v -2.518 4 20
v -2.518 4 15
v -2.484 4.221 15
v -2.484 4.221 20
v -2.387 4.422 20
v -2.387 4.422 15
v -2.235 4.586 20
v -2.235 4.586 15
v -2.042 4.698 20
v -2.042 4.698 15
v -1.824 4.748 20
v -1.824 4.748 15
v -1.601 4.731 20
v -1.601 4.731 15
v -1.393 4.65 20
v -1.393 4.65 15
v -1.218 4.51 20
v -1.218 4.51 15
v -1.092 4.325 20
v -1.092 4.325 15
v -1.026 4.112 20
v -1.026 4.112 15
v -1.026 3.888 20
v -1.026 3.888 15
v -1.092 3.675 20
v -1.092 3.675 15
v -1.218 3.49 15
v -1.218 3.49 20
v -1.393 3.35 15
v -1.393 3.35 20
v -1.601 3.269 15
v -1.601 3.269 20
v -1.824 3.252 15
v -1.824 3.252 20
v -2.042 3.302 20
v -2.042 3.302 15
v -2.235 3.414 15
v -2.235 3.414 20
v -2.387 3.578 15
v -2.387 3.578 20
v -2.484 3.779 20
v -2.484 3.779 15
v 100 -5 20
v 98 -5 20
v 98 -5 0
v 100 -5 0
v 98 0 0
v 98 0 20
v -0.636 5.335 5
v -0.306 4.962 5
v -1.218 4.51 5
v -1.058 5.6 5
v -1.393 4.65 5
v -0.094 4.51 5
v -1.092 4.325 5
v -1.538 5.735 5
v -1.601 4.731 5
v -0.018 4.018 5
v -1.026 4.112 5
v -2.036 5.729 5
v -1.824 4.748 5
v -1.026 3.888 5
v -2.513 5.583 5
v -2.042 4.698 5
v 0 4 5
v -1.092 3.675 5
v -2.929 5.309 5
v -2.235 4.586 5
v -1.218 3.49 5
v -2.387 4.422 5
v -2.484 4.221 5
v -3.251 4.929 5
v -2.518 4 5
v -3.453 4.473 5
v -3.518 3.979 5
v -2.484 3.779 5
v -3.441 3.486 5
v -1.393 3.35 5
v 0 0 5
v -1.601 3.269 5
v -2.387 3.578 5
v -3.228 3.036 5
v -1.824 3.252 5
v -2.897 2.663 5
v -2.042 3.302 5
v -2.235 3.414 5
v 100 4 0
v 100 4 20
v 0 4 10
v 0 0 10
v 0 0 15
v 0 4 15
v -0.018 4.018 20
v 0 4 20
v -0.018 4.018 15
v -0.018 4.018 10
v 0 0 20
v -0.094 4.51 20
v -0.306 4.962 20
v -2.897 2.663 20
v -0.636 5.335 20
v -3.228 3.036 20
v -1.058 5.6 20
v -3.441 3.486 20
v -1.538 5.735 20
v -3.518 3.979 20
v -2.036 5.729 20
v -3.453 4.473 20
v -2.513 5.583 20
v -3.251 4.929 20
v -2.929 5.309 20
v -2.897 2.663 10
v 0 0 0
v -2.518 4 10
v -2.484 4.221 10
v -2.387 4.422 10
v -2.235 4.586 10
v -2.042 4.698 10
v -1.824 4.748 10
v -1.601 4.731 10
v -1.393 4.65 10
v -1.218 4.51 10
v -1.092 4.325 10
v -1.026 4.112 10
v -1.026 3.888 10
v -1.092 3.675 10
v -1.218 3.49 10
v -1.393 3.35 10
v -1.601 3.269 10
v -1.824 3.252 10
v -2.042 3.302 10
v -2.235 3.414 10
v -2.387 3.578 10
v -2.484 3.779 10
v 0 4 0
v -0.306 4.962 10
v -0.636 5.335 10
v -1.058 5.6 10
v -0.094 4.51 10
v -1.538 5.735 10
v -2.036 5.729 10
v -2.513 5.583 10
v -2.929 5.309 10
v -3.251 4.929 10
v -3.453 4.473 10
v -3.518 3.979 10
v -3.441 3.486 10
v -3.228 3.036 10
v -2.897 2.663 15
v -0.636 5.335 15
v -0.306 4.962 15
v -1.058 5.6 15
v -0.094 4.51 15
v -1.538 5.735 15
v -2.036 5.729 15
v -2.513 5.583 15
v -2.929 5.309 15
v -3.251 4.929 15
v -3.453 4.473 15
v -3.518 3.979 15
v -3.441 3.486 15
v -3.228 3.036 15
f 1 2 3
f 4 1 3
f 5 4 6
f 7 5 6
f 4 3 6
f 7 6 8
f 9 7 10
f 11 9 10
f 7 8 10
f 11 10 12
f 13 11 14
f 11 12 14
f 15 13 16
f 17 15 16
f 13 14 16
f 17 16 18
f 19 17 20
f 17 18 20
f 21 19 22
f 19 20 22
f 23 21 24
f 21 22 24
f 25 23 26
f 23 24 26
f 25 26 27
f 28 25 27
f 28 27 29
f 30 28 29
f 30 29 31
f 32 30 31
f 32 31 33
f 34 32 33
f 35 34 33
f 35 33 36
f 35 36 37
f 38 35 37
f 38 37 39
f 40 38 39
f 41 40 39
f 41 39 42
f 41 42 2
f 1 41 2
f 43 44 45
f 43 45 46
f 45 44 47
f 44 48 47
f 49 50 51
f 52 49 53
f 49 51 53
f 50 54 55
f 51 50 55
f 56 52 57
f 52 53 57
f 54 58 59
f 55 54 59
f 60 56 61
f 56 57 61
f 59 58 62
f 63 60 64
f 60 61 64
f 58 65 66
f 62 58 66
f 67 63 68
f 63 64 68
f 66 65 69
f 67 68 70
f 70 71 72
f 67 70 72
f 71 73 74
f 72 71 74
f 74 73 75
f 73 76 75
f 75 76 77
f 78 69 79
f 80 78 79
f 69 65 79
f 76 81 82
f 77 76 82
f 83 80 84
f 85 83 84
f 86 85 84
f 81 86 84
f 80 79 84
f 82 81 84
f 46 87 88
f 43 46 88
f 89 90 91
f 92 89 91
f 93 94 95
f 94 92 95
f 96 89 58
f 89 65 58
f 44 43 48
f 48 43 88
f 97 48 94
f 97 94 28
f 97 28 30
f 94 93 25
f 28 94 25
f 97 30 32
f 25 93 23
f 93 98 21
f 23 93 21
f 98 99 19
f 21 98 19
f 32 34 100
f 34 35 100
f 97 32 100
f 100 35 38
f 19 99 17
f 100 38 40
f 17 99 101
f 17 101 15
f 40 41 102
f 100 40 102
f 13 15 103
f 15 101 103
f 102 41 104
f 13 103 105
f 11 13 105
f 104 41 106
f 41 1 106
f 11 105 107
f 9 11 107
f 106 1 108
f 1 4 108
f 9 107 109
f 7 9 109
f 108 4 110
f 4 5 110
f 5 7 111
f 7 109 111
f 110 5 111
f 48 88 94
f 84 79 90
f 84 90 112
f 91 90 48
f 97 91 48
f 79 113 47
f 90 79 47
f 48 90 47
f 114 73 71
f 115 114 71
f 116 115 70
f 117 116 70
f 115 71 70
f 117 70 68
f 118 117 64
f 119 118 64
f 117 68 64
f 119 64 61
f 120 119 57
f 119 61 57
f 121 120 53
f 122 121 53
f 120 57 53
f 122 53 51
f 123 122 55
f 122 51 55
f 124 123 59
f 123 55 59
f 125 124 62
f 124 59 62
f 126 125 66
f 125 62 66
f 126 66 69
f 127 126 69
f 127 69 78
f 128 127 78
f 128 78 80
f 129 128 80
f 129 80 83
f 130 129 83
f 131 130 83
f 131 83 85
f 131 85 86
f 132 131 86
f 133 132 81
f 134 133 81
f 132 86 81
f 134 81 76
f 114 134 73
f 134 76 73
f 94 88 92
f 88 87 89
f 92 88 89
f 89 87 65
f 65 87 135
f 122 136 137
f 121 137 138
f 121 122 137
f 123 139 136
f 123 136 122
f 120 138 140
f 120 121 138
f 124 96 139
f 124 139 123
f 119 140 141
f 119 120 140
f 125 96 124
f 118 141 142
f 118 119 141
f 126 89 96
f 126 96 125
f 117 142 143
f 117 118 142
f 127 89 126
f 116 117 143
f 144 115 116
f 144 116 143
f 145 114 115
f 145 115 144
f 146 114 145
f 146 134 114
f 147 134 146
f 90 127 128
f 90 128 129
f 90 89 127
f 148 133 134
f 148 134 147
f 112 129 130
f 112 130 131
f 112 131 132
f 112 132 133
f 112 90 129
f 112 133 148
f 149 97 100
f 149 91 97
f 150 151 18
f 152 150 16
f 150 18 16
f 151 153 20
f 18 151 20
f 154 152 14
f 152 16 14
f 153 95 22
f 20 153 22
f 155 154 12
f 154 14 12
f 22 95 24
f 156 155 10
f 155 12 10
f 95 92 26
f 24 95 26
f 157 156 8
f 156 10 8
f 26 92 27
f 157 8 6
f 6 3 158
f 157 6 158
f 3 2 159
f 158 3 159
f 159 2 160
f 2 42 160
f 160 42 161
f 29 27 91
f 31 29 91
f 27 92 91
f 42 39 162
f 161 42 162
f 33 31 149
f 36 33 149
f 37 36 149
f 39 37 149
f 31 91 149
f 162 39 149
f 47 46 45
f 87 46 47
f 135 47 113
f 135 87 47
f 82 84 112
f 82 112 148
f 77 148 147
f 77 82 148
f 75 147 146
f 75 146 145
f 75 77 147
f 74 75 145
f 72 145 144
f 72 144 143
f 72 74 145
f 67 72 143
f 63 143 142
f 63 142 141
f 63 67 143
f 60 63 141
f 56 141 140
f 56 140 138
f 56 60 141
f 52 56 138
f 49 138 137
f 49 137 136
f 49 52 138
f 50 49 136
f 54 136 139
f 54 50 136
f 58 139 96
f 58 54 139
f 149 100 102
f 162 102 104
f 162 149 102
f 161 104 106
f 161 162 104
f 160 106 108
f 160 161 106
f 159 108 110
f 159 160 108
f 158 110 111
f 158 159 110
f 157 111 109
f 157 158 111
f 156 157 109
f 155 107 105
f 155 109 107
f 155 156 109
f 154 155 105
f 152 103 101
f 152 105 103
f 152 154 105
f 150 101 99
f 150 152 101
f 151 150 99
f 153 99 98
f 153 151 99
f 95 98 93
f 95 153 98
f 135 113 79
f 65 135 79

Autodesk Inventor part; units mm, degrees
ref_plane "YZ Plane" through (0, 0, 0) normal (1, 0, 0) x (0, 1, 0)
ref_plane "XZ Plane" through (0, 0, 0) normal (0, 1, 0) x (-1, 0, 0)
ref_plane "XY Plane" through (0, 0, 0) normal (0, 0, 1) x (1, 0, 0)
sketch "Skizze1" plane through (0, 0, 0) normal (0, 0, 1) x (1, 0, 0)
  line L0 (0, 0) -> (100, 0)
  line L1 (100, 0) -> (100, 4)
  line L2 (100, 4) -> (0, 4)
  line L3 (0, 4) -> (0, 0)
  dimension "d0" = 100
  dimension "d1" = 4
extrude "Extrusion1" add sketch "Skizze1" along normal blind 20
sketch "Skizze2" plane through (0, 0, 0) normal (0, 0, -1) x (-1, 0, 0)
  line L0 (0, 4) -> (0, 0) projected
  line L1 (-100, 4) -> (0, 4) projected
  line L2 (0, 4) -> (2.5, 4) construction
  line L3 (1.7678, 5.7678) -> (1.7678, 5.75)
  arc A0 (2.8969, 2.663) -> (0.0178, 4) centre (1.7678, 4) ccw
  line L4 (0, 0) -> (3.0052, 2.7626)
  line L5 (0, 4) -> (0.0179, 4.0179)
  line L6 (1.7499, 5.7499) -> (1.7678, 5.7678)
  circle A1 centre (1.7678, 4) radius 0.75
  dimension "d4" = 2.5
  dimension "d6" = 3.5
  dimension "d9" = 1.5
extrude "Extrusion2" add sketch "Skizze2" against normal blind 20 contours L5 A0 L4 L0 | A1
sketch "Skizze3" plane through (0, 0, 0) normal (0, 0, -1) x (-1, 0, 0)
  point P0 (0, 0)
extrude "Extrusion3" cut sketch "Skizze2" against normal blind 20 contours A1
sketch "Skizze4" plane through (100, 0, 0) normal (0, -1, 0) x (1, 0, 0)
  line L0 (0, 20) -> (-100, 20) projected
  line L1 (0, 0) -> (-100, 0) projected
  line L2 (0, 20) -> (-2, 20)
  line L3 (-2, 20) -> (-2, 0)
  line L4 (-2, 0) -> (0, 0)
  line L5 (0, 0) -> (0, 20)
  dimension "d12" = 2
extrude "Extrusion4" add sketch "Skizze4" along normal blind 5
sketch "Skizze6" plane through (0, 0, 0) normal (0, -1, 0) x (1, 0, 0)
  line L0 (0, 0) -> (0, 20) projected
  line L1 (0, 20) -> (0, 15)
  line L2 (0, 15) -> (0, 10)
  line L3 (0, 10) -> (0, 5)
  line L4 (0, 5) -> (0, 0)
  line L5 (-3.5178, 0) -> (-0.0179, 0) projected
  line L6 (0, 0) -> (-3.5178, 0)
  line L7 (-3.5178, 0) -> (-3.5178, 5)
  line L8 (-3.5178, 0) -> (-3.5178, 20) projected
  line L9 (0, 5) -> (-3.5178, 5)
  line L10 (0, 15) -> (-3.5178, 15)
  line L11 (-3.5178, 15) -> (-3.5178, 10)
  line L12 (0, 10) -> (-3.5178, 10)
  point P0 (-3.0052, 0)
  dimension "d22" = 5
  dimension "d23" = 5
  dimension "d24" = 5
extrude "Extrusion5" cut sketch "Skizze6" against normal blind 50 contours L6 L5 L7 L9 L0 | L12 L8 L10 L0
properties part number "Hebel_Klemme_oben"
